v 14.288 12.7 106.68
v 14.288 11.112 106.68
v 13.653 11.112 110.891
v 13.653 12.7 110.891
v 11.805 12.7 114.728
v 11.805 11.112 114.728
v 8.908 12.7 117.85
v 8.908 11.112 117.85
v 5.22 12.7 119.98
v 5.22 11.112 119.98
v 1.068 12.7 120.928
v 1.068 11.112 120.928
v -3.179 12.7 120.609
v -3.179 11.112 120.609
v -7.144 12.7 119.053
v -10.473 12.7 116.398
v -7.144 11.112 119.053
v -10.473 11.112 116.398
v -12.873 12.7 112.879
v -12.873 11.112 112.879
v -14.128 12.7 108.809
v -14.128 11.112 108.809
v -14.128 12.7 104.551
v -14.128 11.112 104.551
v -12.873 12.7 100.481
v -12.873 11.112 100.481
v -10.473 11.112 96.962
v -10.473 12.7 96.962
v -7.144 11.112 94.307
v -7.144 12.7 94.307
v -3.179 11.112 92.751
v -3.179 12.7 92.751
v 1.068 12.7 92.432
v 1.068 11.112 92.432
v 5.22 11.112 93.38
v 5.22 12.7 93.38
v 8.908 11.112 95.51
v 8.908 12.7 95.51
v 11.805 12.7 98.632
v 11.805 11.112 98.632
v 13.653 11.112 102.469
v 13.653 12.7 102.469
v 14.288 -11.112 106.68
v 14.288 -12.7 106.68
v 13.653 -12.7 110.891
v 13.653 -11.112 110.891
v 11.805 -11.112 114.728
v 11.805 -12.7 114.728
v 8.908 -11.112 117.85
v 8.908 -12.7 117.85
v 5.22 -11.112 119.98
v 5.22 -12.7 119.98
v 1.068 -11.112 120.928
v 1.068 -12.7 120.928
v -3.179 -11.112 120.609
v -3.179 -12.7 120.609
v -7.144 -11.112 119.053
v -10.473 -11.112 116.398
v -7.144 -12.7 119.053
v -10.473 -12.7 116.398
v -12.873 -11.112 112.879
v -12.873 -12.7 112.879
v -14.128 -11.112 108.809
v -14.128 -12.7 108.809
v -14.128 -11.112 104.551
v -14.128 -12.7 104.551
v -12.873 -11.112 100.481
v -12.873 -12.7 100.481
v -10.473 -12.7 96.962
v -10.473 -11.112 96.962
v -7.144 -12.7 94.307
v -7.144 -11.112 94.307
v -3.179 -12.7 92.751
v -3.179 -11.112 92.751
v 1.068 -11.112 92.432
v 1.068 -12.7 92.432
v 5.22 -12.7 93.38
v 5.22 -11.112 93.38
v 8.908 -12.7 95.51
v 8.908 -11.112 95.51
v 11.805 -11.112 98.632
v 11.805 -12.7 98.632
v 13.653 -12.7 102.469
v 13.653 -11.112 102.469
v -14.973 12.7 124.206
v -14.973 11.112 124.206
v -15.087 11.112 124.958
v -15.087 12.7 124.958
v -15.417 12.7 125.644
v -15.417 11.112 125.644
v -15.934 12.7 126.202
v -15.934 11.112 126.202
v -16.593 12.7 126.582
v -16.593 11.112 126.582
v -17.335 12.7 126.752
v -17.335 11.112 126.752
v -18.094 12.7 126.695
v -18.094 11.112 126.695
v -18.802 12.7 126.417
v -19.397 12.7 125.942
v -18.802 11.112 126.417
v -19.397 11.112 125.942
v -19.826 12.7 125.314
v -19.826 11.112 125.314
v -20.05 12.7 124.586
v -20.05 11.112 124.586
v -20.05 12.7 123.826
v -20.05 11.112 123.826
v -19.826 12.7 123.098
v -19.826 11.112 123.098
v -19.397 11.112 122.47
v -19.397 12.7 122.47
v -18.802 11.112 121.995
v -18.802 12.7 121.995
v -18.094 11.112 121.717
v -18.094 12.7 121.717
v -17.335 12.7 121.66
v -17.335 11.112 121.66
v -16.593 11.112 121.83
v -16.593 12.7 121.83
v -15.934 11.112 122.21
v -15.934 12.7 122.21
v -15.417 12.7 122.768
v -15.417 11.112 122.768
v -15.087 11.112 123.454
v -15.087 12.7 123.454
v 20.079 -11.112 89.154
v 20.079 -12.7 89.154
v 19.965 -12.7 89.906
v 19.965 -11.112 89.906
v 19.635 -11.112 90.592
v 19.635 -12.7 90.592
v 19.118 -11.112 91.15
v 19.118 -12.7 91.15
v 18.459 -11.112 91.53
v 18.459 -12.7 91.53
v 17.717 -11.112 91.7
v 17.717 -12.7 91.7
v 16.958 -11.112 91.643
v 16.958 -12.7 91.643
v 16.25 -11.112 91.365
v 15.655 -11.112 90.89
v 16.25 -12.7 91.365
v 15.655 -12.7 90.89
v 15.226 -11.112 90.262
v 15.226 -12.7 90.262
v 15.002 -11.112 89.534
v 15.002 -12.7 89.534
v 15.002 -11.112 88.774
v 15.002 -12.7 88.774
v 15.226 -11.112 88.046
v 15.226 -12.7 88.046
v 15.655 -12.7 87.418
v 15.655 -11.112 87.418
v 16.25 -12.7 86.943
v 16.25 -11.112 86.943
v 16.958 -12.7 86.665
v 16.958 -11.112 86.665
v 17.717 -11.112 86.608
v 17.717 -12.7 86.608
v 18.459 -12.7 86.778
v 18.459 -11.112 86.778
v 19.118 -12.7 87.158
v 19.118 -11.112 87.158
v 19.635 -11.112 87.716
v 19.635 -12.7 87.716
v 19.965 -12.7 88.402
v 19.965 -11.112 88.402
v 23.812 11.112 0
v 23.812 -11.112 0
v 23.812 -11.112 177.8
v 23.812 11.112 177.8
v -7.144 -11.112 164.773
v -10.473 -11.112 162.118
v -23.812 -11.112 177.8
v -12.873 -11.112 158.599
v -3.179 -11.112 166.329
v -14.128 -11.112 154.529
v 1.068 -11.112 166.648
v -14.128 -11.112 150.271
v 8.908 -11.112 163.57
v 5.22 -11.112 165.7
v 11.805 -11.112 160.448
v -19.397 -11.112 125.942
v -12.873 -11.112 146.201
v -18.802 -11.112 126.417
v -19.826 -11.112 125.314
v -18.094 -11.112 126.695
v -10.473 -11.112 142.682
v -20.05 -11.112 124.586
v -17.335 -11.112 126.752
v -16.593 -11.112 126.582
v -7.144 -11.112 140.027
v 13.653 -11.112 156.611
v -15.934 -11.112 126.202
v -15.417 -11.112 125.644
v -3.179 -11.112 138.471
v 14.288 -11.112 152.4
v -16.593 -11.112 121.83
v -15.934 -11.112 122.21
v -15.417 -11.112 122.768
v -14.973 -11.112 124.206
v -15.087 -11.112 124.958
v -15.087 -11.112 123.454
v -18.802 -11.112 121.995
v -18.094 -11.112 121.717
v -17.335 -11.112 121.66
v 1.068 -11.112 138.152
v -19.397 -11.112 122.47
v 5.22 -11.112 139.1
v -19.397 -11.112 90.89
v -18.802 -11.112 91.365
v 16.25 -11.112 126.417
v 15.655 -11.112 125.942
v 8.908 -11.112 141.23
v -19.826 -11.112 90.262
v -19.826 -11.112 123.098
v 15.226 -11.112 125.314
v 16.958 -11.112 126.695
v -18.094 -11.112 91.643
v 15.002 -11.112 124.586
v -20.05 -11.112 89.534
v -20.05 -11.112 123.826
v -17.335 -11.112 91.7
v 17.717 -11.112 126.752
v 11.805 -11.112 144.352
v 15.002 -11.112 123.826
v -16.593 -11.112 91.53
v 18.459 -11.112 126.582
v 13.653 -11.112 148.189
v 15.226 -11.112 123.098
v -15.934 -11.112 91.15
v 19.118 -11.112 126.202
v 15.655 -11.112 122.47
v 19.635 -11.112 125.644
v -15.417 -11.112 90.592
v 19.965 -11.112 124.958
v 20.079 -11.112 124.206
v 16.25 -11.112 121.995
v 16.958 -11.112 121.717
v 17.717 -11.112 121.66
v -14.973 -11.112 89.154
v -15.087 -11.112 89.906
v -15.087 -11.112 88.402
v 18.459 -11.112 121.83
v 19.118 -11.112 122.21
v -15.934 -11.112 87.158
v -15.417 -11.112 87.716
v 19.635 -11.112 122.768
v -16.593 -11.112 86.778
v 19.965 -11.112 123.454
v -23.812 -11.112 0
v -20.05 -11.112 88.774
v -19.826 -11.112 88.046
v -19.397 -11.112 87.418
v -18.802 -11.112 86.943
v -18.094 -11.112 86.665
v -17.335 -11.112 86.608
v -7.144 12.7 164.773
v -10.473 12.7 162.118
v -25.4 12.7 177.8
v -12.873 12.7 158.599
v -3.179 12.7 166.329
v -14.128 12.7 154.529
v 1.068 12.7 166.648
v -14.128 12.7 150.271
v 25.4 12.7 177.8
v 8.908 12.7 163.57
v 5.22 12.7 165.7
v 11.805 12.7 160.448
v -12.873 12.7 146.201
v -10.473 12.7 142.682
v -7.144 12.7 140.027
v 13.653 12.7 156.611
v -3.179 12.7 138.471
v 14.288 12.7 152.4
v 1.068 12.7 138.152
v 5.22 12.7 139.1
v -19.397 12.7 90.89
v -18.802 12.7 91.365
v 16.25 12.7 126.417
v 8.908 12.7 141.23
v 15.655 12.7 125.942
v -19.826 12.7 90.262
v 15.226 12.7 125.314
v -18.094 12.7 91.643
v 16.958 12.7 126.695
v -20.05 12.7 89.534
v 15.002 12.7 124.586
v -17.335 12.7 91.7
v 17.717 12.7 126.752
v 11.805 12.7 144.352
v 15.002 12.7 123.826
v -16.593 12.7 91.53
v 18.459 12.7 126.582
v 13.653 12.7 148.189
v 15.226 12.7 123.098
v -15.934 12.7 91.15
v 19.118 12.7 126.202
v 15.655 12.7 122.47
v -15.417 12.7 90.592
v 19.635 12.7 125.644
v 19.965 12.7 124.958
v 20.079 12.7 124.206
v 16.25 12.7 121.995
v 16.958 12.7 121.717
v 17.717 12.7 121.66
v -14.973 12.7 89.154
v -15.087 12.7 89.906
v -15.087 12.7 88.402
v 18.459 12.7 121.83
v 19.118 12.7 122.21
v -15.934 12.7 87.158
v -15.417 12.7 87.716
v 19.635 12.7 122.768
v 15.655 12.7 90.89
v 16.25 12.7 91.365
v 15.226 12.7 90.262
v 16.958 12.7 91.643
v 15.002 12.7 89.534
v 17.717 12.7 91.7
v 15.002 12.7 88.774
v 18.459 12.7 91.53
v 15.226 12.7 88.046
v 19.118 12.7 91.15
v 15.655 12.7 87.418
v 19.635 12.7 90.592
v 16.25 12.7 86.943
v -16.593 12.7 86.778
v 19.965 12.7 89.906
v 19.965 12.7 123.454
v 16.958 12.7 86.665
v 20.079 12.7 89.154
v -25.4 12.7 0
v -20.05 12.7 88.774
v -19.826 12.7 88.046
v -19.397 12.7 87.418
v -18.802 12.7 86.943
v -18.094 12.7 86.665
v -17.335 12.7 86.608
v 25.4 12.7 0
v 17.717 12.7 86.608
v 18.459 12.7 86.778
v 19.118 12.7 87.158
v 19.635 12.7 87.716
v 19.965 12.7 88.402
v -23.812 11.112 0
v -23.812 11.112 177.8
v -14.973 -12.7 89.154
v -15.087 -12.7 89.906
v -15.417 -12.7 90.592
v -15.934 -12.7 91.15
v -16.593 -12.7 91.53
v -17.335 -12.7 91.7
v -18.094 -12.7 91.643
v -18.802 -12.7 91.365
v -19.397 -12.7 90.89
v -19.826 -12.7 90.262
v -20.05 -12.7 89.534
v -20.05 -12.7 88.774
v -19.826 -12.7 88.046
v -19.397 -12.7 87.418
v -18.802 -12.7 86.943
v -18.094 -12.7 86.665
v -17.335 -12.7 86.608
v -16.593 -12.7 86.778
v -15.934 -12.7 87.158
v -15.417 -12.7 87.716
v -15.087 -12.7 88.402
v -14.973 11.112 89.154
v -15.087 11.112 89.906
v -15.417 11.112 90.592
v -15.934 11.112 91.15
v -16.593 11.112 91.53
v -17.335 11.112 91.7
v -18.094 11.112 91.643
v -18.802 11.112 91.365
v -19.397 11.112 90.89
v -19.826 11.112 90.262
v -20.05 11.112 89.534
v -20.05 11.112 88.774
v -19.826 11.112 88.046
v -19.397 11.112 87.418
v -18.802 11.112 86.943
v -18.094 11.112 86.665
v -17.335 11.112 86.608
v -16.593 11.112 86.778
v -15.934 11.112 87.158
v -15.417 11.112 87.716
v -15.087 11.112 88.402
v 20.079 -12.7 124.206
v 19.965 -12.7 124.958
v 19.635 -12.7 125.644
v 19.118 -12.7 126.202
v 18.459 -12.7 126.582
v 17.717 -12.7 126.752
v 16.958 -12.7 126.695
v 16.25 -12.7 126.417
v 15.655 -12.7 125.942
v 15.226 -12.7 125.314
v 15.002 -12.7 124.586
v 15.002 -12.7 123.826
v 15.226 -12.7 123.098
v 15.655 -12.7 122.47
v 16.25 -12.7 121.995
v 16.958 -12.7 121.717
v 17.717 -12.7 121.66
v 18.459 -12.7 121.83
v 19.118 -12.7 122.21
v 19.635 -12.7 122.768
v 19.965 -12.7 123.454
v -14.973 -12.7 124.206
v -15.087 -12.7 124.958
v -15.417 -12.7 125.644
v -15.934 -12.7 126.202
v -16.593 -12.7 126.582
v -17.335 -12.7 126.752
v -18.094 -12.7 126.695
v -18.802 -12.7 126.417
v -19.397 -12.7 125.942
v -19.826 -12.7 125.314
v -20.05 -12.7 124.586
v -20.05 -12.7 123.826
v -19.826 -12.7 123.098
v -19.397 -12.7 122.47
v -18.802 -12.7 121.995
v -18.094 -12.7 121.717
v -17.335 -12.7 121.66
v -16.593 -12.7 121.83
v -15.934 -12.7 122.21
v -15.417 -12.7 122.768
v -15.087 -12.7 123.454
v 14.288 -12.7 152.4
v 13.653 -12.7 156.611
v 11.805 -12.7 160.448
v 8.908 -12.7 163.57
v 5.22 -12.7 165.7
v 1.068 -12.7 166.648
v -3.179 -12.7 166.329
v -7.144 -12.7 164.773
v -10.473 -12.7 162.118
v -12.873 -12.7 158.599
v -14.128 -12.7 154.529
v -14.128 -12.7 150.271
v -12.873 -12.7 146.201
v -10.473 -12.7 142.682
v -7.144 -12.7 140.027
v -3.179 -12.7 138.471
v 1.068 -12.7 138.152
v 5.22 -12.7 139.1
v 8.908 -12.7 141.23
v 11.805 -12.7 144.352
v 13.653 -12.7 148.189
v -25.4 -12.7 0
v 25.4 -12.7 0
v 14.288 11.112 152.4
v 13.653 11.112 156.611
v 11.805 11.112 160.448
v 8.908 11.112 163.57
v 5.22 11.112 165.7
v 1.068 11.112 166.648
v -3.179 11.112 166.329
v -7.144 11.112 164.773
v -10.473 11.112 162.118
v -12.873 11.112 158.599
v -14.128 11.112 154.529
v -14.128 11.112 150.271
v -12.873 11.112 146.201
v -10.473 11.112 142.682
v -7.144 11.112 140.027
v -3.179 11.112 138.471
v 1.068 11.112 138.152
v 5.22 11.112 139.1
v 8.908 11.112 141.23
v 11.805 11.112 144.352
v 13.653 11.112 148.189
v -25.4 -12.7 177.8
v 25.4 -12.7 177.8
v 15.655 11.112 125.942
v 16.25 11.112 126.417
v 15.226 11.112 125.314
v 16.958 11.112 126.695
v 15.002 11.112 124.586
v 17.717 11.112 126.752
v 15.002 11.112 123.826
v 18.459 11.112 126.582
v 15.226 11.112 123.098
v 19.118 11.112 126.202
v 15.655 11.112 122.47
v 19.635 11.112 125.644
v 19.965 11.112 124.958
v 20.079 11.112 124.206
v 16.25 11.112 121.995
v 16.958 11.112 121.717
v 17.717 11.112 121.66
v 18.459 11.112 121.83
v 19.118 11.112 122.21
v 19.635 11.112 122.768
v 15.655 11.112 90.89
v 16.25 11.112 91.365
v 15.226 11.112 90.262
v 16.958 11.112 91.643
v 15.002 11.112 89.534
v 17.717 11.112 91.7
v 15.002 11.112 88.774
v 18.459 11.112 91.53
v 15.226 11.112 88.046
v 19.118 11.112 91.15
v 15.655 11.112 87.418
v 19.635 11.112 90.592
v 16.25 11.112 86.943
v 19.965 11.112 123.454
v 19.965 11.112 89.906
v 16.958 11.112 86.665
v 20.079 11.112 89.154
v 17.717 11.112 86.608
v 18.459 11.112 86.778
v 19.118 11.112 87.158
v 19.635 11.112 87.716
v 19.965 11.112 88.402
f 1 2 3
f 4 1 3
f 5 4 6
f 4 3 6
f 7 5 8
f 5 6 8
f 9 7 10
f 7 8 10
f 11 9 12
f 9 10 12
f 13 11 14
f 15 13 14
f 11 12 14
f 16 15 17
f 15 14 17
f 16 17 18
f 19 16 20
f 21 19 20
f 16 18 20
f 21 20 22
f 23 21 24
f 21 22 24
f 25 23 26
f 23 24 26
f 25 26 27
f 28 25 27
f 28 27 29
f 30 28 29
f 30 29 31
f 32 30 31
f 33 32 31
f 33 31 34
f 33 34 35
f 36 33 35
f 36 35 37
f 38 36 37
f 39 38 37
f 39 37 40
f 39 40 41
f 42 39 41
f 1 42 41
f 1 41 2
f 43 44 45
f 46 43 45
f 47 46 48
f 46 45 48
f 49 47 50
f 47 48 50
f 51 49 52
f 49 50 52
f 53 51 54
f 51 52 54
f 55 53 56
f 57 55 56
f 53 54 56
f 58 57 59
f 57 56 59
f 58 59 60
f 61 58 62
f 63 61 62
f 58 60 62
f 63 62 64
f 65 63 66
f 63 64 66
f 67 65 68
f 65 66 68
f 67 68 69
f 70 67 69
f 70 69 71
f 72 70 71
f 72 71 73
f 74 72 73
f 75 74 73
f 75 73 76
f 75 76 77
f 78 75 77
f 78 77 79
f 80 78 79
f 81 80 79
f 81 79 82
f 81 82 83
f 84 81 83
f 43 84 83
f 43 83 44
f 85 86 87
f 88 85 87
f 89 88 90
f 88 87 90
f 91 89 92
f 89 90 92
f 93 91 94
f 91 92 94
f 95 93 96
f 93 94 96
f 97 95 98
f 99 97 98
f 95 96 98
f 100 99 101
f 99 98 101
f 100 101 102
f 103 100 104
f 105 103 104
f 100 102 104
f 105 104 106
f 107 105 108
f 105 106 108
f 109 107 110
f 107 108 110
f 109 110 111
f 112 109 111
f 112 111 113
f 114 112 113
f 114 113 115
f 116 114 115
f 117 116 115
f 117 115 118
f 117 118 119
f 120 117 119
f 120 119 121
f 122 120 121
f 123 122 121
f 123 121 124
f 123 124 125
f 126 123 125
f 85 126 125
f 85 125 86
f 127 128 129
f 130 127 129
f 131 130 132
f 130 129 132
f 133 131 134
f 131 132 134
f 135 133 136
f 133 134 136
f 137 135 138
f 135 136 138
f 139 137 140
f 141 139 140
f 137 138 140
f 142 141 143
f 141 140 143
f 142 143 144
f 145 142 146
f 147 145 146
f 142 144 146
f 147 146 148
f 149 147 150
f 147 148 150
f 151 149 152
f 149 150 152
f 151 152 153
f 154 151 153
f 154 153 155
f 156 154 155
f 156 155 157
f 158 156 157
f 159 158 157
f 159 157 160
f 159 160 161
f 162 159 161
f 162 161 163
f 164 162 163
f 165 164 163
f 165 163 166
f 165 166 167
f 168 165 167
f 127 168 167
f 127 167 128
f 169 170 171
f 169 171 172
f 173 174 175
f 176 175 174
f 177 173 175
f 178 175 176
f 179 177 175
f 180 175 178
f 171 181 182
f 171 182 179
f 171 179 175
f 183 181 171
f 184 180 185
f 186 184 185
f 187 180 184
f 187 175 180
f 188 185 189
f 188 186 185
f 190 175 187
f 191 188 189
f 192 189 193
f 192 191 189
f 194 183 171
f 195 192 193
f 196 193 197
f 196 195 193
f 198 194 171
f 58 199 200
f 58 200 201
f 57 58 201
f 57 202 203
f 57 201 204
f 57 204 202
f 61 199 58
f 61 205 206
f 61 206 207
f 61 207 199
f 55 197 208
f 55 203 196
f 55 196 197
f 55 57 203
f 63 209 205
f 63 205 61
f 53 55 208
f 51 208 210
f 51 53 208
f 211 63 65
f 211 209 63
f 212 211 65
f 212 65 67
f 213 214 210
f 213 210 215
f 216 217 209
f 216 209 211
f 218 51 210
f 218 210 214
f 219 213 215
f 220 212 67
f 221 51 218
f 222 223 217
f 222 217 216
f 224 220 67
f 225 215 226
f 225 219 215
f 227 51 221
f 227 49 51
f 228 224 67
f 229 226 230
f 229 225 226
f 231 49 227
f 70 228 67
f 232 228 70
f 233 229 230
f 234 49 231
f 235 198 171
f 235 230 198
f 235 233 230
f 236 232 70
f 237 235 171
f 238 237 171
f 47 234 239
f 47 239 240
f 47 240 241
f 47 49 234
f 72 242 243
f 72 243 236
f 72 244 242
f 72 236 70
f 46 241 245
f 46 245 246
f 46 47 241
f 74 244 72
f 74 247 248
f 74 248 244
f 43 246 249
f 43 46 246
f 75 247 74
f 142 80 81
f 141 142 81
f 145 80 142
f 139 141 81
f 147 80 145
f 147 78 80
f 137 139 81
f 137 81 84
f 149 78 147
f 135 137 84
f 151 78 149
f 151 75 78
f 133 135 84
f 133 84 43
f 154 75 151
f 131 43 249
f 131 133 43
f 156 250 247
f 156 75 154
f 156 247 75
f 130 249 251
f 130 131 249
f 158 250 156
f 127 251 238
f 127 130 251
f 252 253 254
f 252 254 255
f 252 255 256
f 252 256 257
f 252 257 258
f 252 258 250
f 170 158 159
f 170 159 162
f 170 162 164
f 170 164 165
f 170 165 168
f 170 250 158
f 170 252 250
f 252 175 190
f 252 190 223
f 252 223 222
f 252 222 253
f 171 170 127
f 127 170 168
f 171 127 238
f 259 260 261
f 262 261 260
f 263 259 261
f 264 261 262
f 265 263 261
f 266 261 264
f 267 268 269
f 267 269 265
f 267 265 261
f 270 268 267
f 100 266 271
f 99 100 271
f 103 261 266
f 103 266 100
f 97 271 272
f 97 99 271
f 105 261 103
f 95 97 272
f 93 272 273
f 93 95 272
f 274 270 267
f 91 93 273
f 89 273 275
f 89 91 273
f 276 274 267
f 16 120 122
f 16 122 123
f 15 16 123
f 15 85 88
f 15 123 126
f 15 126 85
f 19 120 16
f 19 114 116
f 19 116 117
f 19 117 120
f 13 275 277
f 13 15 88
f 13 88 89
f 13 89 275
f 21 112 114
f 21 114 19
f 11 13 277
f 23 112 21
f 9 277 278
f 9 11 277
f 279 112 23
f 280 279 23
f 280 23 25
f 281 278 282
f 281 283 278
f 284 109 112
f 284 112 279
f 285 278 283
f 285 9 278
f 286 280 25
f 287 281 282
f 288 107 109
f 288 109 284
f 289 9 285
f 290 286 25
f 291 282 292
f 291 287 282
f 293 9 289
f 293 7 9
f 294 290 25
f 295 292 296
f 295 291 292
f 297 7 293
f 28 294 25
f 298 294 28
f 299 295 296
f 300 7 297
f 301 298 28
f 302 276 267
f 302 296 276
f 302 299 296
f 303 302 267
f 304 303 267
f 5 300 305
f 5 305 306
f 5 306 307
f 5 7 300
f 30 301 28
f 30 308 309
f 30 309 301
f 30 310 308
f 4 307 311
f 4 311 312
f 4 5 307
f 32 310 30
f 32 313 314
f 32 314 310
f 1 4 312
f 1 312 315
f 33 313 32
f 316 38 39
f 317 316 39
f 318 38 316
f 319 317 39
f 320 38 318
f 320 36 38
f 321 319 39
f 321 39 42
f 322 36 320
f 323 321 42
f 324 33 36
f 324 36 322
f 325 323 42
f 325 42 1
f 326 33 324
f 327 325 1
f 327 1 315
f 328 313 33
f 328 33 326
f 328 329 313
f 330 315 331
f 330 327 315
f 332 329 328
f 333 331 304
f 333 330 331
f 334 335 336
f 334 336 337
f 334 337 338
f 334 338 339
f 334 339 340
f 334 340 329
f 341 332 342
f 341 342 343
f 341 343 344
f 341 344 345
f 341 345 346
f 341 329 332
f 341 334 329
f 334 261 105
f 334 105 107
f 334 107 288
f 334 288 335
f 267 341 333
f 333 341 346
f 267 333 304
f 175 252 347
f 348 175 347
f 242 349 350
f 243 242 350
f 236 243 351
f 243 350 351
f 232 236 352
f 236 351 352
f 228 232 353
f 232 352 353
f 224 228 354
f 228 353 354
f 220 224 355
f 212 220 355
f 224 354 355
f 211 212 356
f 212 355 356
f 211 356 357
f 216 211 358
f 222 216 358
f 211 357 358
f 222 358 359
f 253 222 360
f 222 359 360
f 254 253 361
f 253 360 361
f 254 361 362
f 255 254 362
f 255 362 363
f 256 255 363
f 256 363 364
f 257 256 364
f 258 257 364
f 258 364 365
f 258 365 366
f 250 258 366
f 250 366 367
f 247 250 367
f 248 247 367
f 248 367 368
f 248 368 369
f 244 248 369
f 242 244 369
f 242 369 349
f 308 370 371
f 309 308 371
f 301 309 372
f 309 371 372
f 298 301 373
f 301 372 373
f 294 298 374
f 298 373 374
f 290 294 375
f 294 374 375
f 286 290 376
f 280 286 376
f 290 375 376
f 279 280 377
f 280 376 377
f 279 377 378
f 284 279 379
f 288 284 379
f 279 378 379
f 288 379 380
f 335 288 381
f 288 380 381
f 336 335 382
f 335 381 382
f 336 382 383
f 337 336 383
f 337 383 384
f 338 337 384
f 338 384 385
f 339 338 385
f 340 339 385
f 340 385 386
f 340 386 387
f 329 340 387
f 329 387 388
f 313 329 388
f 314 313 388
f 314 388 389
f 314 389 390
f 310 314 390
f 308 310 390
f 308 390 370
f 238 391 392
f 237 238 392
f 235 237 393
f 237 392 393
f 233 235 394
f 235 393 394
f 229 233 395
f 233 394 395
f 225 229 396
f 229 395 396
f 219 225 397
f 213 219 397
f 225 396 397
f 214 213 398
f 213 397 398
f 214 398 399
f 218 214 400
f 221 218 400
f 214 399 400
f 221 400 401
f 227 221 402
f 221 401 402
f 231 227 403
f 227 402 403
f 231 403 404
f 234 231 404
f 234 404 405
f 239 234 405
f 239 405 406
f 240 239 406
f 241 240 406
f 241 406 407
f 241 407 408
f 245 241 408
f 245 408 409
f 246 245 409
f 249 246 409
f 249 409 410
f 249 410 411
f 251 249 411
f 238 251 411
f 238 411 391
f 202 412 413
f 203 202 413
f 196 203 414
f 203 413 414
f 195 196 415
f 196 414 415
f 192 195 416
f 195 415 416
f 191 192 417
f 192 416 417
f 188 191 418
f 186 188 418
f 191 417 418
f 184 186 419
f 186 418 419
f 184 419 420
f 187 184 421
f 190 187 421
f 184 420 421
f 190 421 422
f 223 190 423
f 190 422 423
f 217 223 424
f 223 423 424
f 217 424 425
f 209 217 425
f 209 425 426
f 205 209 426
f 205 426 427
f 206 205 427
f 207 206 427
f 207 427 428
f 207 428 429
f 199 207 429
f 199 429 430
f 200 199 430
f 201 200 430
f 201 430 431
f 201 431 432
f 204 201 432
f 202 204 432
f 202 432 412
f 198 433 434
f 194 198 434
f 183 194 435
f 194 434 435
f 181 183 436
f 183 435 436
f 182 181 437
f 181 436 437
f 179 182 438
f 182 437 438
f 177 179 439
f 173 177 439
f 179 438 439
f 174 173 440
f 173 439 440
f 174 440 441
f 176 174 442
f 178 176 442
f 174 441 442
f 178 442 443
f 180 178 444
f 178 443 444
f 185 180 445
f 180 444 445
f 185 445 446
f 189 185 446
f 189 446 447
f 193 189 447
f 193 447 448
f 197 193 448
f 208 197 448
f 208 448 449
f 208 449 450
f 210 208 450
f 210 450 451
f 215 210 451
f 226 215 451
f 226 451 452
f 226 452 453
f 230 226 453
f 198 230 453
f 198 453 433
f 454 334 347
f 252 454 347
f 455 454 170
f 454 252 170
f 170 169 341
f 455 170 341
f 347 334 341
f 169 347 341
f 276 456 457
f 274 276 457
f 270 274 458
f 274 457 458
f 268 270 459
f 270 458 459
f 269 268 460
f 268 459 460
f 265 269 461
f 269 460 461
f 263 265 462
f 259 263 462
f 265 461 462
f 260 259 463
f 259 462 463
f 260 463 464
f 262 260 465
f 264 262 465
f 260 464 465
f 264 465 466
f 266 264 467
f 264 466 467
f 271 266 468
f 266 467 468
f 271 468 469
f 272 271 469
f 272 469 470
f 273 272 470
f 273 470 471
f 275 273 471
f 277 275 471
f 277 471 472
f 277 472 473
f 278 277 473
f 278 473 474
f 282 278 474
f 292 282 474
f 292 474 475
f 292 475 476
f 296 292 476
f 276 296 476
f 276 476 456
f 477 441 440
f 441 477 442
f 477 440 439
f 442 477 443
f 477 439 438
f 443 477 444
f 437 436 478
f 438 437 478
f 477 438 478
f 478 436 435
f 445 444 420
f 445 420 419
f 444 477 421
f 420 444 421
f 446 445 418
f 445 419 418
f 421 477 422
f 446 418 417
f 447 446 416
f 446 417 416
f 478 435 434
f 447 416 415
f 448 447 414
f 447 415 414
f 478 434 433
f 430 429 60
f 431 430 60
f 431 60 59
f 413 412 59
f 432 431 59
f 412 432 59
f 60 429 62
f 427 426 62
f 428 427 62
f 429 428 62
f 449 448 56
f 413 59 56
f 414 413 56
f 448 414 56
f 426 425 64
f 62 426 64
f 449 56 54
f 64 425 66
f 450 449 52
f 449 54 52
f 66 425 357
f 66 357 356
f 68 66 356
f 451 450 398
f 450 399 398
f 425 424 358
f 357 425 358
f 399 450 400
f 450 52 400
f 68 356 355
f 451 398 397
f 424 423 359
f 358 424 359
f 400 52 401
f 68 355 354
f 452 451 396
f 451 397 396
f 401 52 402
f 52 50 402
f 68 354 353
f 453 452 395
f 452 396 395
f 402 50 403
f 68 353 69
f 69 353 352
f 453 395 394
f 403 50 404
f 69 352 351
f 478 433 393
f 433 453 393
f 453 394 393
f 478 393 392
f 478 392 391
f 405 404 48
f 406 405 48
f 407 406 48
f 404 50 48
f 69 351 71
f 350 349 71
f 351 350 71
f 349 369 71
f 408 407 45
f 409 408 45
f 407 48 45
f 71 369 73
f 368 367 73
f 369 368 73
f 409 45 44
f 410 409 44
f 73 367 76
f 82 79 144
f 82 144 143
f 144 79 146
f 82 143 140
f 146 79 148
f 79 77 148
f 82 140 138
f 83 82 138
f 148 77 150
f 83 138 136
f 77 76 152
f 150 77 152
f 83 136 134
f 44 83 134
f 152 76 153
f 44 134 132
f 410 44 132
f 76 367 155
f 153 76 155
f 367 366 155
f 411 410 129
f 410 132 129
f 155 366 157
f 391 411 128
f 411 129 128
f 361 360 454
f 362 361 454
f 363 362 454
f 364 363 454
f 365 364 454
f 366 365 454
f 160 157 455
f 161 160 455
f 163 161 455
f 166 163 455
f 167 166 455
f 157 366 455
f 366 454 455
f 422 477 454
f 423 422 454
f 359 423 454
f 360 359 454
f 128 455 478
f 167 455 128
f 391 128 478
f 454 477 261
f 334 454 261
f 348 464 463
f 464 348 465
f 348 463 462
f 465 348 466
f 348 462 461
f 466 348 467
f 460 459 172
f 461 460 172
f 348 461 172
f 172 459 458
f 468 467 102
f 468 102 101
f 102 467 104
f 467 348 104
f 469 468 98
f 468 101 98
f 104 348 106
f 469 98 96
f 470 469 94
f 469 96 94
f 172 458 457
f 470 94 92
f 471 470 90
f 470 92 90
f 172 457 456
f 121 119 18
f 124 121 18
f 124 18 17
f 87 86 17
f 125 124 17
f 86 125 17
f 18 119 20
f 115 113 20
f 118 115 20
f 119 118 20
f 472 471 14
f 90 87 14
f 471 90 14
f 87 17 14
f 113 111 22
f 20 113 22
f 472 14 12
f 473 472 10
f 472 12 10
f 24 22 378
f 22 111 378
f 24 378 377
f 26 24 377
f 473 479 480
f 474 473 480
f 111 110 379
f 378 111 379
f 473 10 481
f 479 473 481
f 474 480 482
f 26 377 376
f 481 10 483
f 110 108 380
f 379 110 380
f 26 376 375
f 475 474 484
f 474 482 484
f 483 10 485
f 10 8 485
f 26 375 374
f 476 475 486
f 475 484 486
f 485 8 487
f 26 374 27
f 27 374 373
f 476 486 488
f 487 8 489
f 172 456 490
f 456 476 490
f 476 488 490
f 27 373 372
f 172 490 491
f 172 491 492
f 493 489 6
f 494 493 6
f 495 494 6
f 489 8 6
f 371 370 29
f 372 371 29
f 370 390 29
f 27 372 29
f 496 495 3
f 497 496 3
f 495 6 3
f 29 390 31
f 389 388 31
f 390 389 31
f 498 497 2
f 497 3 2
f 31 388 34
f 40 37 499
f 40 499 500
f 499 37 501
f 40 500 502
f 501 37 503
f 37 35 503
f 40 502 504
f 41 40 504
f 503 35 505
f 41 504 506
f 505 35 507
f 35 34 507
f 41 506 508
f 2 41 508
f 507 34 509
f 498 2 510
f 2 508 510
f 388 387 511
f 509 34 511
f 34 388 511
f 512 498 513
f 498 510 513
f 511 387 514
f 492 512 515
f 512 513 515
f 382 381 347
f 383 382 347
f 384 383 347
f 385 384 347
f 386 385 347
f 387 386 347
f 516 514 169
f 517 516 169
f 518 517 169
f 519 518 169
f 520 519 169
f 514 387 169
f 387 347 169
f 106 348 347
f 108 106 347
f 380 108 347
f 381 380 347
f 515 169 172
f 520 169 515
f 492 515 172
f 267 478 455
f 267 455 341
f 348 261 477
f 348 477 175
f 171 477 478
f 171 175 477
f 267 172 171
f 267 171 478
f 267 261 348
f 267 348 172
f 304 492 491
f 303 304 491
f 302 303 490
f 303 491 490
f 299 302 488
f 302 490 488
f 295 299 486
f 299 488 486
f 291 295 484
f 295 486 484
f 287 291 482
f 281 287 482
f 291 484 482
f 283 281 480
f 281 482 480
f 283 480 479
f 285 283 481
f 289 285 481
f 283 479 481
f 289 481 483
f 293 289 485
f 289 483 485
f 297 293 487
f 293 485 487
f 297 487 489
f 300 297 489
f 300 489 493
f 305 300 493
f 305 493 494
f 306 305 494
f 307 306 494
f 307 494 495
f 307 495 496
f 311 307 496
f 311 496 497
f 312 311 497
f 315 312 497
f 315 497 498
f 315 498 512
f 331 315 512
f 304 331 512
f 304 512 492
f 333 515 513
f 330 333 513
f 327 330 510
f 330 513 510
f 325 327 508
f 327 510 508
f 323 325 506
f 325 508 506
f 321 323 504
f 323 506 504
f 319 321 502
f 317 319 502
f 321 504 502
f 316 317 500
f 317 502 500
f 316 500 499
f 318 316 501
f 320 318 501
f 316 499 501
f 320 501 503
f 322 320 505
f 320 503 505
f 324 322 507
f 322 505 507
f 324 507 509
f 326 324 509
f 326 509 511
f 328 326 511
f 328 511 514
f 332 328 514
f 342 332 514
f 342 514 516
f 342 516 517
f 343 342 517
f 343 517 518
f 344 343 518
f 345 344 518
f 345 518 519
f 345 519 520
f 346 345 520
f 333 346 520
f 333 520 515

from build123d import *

# Parameters (mm, degrees)
F0_W     = 50.8
F0_H     = 25.4
F0_W_2   = 47.625
F0_H_2   = 22.225
F1_DEPTH = 177.8
F2_R     = 14.2875
F2_R_2   = 2.5527
F3_DEPTH = 25.4


with BuildPart() as f1:
    # F0 (on Top) → F1 (new body)
    with BuildSketch(Plane.XY):
        Rectangle(F0_W, F0_H)
        Rectangle(F0_W_2, F0_H_2, mode=Mode.SUBTRACT)
    extrude(amount=F1_DEPTH)

    # F2 (on face) → F3 (cut)
    with BuildSketch(Plane.XZ.offset(12.7)):
        with Locations((0, 152.4)):
            Circle(F2_R)
        with Locations((-17.526, 124.206)):
            Circle(F2_R_2)
        with Locations((17.526, 124.206)):
            Circle(F2_R_2)
        with Locations((17.526, 89.154)):
            Circle(F2_R_2)
        with Locations((-17.526, 89.154)):
            Circle(F2_R_2)
        with Locations((0, 106.68)):
            Circle(F2_R)
    extrude(amount=-F3_DEPTH, mode=Mode.SUBTRACT)


solid = f1.part
